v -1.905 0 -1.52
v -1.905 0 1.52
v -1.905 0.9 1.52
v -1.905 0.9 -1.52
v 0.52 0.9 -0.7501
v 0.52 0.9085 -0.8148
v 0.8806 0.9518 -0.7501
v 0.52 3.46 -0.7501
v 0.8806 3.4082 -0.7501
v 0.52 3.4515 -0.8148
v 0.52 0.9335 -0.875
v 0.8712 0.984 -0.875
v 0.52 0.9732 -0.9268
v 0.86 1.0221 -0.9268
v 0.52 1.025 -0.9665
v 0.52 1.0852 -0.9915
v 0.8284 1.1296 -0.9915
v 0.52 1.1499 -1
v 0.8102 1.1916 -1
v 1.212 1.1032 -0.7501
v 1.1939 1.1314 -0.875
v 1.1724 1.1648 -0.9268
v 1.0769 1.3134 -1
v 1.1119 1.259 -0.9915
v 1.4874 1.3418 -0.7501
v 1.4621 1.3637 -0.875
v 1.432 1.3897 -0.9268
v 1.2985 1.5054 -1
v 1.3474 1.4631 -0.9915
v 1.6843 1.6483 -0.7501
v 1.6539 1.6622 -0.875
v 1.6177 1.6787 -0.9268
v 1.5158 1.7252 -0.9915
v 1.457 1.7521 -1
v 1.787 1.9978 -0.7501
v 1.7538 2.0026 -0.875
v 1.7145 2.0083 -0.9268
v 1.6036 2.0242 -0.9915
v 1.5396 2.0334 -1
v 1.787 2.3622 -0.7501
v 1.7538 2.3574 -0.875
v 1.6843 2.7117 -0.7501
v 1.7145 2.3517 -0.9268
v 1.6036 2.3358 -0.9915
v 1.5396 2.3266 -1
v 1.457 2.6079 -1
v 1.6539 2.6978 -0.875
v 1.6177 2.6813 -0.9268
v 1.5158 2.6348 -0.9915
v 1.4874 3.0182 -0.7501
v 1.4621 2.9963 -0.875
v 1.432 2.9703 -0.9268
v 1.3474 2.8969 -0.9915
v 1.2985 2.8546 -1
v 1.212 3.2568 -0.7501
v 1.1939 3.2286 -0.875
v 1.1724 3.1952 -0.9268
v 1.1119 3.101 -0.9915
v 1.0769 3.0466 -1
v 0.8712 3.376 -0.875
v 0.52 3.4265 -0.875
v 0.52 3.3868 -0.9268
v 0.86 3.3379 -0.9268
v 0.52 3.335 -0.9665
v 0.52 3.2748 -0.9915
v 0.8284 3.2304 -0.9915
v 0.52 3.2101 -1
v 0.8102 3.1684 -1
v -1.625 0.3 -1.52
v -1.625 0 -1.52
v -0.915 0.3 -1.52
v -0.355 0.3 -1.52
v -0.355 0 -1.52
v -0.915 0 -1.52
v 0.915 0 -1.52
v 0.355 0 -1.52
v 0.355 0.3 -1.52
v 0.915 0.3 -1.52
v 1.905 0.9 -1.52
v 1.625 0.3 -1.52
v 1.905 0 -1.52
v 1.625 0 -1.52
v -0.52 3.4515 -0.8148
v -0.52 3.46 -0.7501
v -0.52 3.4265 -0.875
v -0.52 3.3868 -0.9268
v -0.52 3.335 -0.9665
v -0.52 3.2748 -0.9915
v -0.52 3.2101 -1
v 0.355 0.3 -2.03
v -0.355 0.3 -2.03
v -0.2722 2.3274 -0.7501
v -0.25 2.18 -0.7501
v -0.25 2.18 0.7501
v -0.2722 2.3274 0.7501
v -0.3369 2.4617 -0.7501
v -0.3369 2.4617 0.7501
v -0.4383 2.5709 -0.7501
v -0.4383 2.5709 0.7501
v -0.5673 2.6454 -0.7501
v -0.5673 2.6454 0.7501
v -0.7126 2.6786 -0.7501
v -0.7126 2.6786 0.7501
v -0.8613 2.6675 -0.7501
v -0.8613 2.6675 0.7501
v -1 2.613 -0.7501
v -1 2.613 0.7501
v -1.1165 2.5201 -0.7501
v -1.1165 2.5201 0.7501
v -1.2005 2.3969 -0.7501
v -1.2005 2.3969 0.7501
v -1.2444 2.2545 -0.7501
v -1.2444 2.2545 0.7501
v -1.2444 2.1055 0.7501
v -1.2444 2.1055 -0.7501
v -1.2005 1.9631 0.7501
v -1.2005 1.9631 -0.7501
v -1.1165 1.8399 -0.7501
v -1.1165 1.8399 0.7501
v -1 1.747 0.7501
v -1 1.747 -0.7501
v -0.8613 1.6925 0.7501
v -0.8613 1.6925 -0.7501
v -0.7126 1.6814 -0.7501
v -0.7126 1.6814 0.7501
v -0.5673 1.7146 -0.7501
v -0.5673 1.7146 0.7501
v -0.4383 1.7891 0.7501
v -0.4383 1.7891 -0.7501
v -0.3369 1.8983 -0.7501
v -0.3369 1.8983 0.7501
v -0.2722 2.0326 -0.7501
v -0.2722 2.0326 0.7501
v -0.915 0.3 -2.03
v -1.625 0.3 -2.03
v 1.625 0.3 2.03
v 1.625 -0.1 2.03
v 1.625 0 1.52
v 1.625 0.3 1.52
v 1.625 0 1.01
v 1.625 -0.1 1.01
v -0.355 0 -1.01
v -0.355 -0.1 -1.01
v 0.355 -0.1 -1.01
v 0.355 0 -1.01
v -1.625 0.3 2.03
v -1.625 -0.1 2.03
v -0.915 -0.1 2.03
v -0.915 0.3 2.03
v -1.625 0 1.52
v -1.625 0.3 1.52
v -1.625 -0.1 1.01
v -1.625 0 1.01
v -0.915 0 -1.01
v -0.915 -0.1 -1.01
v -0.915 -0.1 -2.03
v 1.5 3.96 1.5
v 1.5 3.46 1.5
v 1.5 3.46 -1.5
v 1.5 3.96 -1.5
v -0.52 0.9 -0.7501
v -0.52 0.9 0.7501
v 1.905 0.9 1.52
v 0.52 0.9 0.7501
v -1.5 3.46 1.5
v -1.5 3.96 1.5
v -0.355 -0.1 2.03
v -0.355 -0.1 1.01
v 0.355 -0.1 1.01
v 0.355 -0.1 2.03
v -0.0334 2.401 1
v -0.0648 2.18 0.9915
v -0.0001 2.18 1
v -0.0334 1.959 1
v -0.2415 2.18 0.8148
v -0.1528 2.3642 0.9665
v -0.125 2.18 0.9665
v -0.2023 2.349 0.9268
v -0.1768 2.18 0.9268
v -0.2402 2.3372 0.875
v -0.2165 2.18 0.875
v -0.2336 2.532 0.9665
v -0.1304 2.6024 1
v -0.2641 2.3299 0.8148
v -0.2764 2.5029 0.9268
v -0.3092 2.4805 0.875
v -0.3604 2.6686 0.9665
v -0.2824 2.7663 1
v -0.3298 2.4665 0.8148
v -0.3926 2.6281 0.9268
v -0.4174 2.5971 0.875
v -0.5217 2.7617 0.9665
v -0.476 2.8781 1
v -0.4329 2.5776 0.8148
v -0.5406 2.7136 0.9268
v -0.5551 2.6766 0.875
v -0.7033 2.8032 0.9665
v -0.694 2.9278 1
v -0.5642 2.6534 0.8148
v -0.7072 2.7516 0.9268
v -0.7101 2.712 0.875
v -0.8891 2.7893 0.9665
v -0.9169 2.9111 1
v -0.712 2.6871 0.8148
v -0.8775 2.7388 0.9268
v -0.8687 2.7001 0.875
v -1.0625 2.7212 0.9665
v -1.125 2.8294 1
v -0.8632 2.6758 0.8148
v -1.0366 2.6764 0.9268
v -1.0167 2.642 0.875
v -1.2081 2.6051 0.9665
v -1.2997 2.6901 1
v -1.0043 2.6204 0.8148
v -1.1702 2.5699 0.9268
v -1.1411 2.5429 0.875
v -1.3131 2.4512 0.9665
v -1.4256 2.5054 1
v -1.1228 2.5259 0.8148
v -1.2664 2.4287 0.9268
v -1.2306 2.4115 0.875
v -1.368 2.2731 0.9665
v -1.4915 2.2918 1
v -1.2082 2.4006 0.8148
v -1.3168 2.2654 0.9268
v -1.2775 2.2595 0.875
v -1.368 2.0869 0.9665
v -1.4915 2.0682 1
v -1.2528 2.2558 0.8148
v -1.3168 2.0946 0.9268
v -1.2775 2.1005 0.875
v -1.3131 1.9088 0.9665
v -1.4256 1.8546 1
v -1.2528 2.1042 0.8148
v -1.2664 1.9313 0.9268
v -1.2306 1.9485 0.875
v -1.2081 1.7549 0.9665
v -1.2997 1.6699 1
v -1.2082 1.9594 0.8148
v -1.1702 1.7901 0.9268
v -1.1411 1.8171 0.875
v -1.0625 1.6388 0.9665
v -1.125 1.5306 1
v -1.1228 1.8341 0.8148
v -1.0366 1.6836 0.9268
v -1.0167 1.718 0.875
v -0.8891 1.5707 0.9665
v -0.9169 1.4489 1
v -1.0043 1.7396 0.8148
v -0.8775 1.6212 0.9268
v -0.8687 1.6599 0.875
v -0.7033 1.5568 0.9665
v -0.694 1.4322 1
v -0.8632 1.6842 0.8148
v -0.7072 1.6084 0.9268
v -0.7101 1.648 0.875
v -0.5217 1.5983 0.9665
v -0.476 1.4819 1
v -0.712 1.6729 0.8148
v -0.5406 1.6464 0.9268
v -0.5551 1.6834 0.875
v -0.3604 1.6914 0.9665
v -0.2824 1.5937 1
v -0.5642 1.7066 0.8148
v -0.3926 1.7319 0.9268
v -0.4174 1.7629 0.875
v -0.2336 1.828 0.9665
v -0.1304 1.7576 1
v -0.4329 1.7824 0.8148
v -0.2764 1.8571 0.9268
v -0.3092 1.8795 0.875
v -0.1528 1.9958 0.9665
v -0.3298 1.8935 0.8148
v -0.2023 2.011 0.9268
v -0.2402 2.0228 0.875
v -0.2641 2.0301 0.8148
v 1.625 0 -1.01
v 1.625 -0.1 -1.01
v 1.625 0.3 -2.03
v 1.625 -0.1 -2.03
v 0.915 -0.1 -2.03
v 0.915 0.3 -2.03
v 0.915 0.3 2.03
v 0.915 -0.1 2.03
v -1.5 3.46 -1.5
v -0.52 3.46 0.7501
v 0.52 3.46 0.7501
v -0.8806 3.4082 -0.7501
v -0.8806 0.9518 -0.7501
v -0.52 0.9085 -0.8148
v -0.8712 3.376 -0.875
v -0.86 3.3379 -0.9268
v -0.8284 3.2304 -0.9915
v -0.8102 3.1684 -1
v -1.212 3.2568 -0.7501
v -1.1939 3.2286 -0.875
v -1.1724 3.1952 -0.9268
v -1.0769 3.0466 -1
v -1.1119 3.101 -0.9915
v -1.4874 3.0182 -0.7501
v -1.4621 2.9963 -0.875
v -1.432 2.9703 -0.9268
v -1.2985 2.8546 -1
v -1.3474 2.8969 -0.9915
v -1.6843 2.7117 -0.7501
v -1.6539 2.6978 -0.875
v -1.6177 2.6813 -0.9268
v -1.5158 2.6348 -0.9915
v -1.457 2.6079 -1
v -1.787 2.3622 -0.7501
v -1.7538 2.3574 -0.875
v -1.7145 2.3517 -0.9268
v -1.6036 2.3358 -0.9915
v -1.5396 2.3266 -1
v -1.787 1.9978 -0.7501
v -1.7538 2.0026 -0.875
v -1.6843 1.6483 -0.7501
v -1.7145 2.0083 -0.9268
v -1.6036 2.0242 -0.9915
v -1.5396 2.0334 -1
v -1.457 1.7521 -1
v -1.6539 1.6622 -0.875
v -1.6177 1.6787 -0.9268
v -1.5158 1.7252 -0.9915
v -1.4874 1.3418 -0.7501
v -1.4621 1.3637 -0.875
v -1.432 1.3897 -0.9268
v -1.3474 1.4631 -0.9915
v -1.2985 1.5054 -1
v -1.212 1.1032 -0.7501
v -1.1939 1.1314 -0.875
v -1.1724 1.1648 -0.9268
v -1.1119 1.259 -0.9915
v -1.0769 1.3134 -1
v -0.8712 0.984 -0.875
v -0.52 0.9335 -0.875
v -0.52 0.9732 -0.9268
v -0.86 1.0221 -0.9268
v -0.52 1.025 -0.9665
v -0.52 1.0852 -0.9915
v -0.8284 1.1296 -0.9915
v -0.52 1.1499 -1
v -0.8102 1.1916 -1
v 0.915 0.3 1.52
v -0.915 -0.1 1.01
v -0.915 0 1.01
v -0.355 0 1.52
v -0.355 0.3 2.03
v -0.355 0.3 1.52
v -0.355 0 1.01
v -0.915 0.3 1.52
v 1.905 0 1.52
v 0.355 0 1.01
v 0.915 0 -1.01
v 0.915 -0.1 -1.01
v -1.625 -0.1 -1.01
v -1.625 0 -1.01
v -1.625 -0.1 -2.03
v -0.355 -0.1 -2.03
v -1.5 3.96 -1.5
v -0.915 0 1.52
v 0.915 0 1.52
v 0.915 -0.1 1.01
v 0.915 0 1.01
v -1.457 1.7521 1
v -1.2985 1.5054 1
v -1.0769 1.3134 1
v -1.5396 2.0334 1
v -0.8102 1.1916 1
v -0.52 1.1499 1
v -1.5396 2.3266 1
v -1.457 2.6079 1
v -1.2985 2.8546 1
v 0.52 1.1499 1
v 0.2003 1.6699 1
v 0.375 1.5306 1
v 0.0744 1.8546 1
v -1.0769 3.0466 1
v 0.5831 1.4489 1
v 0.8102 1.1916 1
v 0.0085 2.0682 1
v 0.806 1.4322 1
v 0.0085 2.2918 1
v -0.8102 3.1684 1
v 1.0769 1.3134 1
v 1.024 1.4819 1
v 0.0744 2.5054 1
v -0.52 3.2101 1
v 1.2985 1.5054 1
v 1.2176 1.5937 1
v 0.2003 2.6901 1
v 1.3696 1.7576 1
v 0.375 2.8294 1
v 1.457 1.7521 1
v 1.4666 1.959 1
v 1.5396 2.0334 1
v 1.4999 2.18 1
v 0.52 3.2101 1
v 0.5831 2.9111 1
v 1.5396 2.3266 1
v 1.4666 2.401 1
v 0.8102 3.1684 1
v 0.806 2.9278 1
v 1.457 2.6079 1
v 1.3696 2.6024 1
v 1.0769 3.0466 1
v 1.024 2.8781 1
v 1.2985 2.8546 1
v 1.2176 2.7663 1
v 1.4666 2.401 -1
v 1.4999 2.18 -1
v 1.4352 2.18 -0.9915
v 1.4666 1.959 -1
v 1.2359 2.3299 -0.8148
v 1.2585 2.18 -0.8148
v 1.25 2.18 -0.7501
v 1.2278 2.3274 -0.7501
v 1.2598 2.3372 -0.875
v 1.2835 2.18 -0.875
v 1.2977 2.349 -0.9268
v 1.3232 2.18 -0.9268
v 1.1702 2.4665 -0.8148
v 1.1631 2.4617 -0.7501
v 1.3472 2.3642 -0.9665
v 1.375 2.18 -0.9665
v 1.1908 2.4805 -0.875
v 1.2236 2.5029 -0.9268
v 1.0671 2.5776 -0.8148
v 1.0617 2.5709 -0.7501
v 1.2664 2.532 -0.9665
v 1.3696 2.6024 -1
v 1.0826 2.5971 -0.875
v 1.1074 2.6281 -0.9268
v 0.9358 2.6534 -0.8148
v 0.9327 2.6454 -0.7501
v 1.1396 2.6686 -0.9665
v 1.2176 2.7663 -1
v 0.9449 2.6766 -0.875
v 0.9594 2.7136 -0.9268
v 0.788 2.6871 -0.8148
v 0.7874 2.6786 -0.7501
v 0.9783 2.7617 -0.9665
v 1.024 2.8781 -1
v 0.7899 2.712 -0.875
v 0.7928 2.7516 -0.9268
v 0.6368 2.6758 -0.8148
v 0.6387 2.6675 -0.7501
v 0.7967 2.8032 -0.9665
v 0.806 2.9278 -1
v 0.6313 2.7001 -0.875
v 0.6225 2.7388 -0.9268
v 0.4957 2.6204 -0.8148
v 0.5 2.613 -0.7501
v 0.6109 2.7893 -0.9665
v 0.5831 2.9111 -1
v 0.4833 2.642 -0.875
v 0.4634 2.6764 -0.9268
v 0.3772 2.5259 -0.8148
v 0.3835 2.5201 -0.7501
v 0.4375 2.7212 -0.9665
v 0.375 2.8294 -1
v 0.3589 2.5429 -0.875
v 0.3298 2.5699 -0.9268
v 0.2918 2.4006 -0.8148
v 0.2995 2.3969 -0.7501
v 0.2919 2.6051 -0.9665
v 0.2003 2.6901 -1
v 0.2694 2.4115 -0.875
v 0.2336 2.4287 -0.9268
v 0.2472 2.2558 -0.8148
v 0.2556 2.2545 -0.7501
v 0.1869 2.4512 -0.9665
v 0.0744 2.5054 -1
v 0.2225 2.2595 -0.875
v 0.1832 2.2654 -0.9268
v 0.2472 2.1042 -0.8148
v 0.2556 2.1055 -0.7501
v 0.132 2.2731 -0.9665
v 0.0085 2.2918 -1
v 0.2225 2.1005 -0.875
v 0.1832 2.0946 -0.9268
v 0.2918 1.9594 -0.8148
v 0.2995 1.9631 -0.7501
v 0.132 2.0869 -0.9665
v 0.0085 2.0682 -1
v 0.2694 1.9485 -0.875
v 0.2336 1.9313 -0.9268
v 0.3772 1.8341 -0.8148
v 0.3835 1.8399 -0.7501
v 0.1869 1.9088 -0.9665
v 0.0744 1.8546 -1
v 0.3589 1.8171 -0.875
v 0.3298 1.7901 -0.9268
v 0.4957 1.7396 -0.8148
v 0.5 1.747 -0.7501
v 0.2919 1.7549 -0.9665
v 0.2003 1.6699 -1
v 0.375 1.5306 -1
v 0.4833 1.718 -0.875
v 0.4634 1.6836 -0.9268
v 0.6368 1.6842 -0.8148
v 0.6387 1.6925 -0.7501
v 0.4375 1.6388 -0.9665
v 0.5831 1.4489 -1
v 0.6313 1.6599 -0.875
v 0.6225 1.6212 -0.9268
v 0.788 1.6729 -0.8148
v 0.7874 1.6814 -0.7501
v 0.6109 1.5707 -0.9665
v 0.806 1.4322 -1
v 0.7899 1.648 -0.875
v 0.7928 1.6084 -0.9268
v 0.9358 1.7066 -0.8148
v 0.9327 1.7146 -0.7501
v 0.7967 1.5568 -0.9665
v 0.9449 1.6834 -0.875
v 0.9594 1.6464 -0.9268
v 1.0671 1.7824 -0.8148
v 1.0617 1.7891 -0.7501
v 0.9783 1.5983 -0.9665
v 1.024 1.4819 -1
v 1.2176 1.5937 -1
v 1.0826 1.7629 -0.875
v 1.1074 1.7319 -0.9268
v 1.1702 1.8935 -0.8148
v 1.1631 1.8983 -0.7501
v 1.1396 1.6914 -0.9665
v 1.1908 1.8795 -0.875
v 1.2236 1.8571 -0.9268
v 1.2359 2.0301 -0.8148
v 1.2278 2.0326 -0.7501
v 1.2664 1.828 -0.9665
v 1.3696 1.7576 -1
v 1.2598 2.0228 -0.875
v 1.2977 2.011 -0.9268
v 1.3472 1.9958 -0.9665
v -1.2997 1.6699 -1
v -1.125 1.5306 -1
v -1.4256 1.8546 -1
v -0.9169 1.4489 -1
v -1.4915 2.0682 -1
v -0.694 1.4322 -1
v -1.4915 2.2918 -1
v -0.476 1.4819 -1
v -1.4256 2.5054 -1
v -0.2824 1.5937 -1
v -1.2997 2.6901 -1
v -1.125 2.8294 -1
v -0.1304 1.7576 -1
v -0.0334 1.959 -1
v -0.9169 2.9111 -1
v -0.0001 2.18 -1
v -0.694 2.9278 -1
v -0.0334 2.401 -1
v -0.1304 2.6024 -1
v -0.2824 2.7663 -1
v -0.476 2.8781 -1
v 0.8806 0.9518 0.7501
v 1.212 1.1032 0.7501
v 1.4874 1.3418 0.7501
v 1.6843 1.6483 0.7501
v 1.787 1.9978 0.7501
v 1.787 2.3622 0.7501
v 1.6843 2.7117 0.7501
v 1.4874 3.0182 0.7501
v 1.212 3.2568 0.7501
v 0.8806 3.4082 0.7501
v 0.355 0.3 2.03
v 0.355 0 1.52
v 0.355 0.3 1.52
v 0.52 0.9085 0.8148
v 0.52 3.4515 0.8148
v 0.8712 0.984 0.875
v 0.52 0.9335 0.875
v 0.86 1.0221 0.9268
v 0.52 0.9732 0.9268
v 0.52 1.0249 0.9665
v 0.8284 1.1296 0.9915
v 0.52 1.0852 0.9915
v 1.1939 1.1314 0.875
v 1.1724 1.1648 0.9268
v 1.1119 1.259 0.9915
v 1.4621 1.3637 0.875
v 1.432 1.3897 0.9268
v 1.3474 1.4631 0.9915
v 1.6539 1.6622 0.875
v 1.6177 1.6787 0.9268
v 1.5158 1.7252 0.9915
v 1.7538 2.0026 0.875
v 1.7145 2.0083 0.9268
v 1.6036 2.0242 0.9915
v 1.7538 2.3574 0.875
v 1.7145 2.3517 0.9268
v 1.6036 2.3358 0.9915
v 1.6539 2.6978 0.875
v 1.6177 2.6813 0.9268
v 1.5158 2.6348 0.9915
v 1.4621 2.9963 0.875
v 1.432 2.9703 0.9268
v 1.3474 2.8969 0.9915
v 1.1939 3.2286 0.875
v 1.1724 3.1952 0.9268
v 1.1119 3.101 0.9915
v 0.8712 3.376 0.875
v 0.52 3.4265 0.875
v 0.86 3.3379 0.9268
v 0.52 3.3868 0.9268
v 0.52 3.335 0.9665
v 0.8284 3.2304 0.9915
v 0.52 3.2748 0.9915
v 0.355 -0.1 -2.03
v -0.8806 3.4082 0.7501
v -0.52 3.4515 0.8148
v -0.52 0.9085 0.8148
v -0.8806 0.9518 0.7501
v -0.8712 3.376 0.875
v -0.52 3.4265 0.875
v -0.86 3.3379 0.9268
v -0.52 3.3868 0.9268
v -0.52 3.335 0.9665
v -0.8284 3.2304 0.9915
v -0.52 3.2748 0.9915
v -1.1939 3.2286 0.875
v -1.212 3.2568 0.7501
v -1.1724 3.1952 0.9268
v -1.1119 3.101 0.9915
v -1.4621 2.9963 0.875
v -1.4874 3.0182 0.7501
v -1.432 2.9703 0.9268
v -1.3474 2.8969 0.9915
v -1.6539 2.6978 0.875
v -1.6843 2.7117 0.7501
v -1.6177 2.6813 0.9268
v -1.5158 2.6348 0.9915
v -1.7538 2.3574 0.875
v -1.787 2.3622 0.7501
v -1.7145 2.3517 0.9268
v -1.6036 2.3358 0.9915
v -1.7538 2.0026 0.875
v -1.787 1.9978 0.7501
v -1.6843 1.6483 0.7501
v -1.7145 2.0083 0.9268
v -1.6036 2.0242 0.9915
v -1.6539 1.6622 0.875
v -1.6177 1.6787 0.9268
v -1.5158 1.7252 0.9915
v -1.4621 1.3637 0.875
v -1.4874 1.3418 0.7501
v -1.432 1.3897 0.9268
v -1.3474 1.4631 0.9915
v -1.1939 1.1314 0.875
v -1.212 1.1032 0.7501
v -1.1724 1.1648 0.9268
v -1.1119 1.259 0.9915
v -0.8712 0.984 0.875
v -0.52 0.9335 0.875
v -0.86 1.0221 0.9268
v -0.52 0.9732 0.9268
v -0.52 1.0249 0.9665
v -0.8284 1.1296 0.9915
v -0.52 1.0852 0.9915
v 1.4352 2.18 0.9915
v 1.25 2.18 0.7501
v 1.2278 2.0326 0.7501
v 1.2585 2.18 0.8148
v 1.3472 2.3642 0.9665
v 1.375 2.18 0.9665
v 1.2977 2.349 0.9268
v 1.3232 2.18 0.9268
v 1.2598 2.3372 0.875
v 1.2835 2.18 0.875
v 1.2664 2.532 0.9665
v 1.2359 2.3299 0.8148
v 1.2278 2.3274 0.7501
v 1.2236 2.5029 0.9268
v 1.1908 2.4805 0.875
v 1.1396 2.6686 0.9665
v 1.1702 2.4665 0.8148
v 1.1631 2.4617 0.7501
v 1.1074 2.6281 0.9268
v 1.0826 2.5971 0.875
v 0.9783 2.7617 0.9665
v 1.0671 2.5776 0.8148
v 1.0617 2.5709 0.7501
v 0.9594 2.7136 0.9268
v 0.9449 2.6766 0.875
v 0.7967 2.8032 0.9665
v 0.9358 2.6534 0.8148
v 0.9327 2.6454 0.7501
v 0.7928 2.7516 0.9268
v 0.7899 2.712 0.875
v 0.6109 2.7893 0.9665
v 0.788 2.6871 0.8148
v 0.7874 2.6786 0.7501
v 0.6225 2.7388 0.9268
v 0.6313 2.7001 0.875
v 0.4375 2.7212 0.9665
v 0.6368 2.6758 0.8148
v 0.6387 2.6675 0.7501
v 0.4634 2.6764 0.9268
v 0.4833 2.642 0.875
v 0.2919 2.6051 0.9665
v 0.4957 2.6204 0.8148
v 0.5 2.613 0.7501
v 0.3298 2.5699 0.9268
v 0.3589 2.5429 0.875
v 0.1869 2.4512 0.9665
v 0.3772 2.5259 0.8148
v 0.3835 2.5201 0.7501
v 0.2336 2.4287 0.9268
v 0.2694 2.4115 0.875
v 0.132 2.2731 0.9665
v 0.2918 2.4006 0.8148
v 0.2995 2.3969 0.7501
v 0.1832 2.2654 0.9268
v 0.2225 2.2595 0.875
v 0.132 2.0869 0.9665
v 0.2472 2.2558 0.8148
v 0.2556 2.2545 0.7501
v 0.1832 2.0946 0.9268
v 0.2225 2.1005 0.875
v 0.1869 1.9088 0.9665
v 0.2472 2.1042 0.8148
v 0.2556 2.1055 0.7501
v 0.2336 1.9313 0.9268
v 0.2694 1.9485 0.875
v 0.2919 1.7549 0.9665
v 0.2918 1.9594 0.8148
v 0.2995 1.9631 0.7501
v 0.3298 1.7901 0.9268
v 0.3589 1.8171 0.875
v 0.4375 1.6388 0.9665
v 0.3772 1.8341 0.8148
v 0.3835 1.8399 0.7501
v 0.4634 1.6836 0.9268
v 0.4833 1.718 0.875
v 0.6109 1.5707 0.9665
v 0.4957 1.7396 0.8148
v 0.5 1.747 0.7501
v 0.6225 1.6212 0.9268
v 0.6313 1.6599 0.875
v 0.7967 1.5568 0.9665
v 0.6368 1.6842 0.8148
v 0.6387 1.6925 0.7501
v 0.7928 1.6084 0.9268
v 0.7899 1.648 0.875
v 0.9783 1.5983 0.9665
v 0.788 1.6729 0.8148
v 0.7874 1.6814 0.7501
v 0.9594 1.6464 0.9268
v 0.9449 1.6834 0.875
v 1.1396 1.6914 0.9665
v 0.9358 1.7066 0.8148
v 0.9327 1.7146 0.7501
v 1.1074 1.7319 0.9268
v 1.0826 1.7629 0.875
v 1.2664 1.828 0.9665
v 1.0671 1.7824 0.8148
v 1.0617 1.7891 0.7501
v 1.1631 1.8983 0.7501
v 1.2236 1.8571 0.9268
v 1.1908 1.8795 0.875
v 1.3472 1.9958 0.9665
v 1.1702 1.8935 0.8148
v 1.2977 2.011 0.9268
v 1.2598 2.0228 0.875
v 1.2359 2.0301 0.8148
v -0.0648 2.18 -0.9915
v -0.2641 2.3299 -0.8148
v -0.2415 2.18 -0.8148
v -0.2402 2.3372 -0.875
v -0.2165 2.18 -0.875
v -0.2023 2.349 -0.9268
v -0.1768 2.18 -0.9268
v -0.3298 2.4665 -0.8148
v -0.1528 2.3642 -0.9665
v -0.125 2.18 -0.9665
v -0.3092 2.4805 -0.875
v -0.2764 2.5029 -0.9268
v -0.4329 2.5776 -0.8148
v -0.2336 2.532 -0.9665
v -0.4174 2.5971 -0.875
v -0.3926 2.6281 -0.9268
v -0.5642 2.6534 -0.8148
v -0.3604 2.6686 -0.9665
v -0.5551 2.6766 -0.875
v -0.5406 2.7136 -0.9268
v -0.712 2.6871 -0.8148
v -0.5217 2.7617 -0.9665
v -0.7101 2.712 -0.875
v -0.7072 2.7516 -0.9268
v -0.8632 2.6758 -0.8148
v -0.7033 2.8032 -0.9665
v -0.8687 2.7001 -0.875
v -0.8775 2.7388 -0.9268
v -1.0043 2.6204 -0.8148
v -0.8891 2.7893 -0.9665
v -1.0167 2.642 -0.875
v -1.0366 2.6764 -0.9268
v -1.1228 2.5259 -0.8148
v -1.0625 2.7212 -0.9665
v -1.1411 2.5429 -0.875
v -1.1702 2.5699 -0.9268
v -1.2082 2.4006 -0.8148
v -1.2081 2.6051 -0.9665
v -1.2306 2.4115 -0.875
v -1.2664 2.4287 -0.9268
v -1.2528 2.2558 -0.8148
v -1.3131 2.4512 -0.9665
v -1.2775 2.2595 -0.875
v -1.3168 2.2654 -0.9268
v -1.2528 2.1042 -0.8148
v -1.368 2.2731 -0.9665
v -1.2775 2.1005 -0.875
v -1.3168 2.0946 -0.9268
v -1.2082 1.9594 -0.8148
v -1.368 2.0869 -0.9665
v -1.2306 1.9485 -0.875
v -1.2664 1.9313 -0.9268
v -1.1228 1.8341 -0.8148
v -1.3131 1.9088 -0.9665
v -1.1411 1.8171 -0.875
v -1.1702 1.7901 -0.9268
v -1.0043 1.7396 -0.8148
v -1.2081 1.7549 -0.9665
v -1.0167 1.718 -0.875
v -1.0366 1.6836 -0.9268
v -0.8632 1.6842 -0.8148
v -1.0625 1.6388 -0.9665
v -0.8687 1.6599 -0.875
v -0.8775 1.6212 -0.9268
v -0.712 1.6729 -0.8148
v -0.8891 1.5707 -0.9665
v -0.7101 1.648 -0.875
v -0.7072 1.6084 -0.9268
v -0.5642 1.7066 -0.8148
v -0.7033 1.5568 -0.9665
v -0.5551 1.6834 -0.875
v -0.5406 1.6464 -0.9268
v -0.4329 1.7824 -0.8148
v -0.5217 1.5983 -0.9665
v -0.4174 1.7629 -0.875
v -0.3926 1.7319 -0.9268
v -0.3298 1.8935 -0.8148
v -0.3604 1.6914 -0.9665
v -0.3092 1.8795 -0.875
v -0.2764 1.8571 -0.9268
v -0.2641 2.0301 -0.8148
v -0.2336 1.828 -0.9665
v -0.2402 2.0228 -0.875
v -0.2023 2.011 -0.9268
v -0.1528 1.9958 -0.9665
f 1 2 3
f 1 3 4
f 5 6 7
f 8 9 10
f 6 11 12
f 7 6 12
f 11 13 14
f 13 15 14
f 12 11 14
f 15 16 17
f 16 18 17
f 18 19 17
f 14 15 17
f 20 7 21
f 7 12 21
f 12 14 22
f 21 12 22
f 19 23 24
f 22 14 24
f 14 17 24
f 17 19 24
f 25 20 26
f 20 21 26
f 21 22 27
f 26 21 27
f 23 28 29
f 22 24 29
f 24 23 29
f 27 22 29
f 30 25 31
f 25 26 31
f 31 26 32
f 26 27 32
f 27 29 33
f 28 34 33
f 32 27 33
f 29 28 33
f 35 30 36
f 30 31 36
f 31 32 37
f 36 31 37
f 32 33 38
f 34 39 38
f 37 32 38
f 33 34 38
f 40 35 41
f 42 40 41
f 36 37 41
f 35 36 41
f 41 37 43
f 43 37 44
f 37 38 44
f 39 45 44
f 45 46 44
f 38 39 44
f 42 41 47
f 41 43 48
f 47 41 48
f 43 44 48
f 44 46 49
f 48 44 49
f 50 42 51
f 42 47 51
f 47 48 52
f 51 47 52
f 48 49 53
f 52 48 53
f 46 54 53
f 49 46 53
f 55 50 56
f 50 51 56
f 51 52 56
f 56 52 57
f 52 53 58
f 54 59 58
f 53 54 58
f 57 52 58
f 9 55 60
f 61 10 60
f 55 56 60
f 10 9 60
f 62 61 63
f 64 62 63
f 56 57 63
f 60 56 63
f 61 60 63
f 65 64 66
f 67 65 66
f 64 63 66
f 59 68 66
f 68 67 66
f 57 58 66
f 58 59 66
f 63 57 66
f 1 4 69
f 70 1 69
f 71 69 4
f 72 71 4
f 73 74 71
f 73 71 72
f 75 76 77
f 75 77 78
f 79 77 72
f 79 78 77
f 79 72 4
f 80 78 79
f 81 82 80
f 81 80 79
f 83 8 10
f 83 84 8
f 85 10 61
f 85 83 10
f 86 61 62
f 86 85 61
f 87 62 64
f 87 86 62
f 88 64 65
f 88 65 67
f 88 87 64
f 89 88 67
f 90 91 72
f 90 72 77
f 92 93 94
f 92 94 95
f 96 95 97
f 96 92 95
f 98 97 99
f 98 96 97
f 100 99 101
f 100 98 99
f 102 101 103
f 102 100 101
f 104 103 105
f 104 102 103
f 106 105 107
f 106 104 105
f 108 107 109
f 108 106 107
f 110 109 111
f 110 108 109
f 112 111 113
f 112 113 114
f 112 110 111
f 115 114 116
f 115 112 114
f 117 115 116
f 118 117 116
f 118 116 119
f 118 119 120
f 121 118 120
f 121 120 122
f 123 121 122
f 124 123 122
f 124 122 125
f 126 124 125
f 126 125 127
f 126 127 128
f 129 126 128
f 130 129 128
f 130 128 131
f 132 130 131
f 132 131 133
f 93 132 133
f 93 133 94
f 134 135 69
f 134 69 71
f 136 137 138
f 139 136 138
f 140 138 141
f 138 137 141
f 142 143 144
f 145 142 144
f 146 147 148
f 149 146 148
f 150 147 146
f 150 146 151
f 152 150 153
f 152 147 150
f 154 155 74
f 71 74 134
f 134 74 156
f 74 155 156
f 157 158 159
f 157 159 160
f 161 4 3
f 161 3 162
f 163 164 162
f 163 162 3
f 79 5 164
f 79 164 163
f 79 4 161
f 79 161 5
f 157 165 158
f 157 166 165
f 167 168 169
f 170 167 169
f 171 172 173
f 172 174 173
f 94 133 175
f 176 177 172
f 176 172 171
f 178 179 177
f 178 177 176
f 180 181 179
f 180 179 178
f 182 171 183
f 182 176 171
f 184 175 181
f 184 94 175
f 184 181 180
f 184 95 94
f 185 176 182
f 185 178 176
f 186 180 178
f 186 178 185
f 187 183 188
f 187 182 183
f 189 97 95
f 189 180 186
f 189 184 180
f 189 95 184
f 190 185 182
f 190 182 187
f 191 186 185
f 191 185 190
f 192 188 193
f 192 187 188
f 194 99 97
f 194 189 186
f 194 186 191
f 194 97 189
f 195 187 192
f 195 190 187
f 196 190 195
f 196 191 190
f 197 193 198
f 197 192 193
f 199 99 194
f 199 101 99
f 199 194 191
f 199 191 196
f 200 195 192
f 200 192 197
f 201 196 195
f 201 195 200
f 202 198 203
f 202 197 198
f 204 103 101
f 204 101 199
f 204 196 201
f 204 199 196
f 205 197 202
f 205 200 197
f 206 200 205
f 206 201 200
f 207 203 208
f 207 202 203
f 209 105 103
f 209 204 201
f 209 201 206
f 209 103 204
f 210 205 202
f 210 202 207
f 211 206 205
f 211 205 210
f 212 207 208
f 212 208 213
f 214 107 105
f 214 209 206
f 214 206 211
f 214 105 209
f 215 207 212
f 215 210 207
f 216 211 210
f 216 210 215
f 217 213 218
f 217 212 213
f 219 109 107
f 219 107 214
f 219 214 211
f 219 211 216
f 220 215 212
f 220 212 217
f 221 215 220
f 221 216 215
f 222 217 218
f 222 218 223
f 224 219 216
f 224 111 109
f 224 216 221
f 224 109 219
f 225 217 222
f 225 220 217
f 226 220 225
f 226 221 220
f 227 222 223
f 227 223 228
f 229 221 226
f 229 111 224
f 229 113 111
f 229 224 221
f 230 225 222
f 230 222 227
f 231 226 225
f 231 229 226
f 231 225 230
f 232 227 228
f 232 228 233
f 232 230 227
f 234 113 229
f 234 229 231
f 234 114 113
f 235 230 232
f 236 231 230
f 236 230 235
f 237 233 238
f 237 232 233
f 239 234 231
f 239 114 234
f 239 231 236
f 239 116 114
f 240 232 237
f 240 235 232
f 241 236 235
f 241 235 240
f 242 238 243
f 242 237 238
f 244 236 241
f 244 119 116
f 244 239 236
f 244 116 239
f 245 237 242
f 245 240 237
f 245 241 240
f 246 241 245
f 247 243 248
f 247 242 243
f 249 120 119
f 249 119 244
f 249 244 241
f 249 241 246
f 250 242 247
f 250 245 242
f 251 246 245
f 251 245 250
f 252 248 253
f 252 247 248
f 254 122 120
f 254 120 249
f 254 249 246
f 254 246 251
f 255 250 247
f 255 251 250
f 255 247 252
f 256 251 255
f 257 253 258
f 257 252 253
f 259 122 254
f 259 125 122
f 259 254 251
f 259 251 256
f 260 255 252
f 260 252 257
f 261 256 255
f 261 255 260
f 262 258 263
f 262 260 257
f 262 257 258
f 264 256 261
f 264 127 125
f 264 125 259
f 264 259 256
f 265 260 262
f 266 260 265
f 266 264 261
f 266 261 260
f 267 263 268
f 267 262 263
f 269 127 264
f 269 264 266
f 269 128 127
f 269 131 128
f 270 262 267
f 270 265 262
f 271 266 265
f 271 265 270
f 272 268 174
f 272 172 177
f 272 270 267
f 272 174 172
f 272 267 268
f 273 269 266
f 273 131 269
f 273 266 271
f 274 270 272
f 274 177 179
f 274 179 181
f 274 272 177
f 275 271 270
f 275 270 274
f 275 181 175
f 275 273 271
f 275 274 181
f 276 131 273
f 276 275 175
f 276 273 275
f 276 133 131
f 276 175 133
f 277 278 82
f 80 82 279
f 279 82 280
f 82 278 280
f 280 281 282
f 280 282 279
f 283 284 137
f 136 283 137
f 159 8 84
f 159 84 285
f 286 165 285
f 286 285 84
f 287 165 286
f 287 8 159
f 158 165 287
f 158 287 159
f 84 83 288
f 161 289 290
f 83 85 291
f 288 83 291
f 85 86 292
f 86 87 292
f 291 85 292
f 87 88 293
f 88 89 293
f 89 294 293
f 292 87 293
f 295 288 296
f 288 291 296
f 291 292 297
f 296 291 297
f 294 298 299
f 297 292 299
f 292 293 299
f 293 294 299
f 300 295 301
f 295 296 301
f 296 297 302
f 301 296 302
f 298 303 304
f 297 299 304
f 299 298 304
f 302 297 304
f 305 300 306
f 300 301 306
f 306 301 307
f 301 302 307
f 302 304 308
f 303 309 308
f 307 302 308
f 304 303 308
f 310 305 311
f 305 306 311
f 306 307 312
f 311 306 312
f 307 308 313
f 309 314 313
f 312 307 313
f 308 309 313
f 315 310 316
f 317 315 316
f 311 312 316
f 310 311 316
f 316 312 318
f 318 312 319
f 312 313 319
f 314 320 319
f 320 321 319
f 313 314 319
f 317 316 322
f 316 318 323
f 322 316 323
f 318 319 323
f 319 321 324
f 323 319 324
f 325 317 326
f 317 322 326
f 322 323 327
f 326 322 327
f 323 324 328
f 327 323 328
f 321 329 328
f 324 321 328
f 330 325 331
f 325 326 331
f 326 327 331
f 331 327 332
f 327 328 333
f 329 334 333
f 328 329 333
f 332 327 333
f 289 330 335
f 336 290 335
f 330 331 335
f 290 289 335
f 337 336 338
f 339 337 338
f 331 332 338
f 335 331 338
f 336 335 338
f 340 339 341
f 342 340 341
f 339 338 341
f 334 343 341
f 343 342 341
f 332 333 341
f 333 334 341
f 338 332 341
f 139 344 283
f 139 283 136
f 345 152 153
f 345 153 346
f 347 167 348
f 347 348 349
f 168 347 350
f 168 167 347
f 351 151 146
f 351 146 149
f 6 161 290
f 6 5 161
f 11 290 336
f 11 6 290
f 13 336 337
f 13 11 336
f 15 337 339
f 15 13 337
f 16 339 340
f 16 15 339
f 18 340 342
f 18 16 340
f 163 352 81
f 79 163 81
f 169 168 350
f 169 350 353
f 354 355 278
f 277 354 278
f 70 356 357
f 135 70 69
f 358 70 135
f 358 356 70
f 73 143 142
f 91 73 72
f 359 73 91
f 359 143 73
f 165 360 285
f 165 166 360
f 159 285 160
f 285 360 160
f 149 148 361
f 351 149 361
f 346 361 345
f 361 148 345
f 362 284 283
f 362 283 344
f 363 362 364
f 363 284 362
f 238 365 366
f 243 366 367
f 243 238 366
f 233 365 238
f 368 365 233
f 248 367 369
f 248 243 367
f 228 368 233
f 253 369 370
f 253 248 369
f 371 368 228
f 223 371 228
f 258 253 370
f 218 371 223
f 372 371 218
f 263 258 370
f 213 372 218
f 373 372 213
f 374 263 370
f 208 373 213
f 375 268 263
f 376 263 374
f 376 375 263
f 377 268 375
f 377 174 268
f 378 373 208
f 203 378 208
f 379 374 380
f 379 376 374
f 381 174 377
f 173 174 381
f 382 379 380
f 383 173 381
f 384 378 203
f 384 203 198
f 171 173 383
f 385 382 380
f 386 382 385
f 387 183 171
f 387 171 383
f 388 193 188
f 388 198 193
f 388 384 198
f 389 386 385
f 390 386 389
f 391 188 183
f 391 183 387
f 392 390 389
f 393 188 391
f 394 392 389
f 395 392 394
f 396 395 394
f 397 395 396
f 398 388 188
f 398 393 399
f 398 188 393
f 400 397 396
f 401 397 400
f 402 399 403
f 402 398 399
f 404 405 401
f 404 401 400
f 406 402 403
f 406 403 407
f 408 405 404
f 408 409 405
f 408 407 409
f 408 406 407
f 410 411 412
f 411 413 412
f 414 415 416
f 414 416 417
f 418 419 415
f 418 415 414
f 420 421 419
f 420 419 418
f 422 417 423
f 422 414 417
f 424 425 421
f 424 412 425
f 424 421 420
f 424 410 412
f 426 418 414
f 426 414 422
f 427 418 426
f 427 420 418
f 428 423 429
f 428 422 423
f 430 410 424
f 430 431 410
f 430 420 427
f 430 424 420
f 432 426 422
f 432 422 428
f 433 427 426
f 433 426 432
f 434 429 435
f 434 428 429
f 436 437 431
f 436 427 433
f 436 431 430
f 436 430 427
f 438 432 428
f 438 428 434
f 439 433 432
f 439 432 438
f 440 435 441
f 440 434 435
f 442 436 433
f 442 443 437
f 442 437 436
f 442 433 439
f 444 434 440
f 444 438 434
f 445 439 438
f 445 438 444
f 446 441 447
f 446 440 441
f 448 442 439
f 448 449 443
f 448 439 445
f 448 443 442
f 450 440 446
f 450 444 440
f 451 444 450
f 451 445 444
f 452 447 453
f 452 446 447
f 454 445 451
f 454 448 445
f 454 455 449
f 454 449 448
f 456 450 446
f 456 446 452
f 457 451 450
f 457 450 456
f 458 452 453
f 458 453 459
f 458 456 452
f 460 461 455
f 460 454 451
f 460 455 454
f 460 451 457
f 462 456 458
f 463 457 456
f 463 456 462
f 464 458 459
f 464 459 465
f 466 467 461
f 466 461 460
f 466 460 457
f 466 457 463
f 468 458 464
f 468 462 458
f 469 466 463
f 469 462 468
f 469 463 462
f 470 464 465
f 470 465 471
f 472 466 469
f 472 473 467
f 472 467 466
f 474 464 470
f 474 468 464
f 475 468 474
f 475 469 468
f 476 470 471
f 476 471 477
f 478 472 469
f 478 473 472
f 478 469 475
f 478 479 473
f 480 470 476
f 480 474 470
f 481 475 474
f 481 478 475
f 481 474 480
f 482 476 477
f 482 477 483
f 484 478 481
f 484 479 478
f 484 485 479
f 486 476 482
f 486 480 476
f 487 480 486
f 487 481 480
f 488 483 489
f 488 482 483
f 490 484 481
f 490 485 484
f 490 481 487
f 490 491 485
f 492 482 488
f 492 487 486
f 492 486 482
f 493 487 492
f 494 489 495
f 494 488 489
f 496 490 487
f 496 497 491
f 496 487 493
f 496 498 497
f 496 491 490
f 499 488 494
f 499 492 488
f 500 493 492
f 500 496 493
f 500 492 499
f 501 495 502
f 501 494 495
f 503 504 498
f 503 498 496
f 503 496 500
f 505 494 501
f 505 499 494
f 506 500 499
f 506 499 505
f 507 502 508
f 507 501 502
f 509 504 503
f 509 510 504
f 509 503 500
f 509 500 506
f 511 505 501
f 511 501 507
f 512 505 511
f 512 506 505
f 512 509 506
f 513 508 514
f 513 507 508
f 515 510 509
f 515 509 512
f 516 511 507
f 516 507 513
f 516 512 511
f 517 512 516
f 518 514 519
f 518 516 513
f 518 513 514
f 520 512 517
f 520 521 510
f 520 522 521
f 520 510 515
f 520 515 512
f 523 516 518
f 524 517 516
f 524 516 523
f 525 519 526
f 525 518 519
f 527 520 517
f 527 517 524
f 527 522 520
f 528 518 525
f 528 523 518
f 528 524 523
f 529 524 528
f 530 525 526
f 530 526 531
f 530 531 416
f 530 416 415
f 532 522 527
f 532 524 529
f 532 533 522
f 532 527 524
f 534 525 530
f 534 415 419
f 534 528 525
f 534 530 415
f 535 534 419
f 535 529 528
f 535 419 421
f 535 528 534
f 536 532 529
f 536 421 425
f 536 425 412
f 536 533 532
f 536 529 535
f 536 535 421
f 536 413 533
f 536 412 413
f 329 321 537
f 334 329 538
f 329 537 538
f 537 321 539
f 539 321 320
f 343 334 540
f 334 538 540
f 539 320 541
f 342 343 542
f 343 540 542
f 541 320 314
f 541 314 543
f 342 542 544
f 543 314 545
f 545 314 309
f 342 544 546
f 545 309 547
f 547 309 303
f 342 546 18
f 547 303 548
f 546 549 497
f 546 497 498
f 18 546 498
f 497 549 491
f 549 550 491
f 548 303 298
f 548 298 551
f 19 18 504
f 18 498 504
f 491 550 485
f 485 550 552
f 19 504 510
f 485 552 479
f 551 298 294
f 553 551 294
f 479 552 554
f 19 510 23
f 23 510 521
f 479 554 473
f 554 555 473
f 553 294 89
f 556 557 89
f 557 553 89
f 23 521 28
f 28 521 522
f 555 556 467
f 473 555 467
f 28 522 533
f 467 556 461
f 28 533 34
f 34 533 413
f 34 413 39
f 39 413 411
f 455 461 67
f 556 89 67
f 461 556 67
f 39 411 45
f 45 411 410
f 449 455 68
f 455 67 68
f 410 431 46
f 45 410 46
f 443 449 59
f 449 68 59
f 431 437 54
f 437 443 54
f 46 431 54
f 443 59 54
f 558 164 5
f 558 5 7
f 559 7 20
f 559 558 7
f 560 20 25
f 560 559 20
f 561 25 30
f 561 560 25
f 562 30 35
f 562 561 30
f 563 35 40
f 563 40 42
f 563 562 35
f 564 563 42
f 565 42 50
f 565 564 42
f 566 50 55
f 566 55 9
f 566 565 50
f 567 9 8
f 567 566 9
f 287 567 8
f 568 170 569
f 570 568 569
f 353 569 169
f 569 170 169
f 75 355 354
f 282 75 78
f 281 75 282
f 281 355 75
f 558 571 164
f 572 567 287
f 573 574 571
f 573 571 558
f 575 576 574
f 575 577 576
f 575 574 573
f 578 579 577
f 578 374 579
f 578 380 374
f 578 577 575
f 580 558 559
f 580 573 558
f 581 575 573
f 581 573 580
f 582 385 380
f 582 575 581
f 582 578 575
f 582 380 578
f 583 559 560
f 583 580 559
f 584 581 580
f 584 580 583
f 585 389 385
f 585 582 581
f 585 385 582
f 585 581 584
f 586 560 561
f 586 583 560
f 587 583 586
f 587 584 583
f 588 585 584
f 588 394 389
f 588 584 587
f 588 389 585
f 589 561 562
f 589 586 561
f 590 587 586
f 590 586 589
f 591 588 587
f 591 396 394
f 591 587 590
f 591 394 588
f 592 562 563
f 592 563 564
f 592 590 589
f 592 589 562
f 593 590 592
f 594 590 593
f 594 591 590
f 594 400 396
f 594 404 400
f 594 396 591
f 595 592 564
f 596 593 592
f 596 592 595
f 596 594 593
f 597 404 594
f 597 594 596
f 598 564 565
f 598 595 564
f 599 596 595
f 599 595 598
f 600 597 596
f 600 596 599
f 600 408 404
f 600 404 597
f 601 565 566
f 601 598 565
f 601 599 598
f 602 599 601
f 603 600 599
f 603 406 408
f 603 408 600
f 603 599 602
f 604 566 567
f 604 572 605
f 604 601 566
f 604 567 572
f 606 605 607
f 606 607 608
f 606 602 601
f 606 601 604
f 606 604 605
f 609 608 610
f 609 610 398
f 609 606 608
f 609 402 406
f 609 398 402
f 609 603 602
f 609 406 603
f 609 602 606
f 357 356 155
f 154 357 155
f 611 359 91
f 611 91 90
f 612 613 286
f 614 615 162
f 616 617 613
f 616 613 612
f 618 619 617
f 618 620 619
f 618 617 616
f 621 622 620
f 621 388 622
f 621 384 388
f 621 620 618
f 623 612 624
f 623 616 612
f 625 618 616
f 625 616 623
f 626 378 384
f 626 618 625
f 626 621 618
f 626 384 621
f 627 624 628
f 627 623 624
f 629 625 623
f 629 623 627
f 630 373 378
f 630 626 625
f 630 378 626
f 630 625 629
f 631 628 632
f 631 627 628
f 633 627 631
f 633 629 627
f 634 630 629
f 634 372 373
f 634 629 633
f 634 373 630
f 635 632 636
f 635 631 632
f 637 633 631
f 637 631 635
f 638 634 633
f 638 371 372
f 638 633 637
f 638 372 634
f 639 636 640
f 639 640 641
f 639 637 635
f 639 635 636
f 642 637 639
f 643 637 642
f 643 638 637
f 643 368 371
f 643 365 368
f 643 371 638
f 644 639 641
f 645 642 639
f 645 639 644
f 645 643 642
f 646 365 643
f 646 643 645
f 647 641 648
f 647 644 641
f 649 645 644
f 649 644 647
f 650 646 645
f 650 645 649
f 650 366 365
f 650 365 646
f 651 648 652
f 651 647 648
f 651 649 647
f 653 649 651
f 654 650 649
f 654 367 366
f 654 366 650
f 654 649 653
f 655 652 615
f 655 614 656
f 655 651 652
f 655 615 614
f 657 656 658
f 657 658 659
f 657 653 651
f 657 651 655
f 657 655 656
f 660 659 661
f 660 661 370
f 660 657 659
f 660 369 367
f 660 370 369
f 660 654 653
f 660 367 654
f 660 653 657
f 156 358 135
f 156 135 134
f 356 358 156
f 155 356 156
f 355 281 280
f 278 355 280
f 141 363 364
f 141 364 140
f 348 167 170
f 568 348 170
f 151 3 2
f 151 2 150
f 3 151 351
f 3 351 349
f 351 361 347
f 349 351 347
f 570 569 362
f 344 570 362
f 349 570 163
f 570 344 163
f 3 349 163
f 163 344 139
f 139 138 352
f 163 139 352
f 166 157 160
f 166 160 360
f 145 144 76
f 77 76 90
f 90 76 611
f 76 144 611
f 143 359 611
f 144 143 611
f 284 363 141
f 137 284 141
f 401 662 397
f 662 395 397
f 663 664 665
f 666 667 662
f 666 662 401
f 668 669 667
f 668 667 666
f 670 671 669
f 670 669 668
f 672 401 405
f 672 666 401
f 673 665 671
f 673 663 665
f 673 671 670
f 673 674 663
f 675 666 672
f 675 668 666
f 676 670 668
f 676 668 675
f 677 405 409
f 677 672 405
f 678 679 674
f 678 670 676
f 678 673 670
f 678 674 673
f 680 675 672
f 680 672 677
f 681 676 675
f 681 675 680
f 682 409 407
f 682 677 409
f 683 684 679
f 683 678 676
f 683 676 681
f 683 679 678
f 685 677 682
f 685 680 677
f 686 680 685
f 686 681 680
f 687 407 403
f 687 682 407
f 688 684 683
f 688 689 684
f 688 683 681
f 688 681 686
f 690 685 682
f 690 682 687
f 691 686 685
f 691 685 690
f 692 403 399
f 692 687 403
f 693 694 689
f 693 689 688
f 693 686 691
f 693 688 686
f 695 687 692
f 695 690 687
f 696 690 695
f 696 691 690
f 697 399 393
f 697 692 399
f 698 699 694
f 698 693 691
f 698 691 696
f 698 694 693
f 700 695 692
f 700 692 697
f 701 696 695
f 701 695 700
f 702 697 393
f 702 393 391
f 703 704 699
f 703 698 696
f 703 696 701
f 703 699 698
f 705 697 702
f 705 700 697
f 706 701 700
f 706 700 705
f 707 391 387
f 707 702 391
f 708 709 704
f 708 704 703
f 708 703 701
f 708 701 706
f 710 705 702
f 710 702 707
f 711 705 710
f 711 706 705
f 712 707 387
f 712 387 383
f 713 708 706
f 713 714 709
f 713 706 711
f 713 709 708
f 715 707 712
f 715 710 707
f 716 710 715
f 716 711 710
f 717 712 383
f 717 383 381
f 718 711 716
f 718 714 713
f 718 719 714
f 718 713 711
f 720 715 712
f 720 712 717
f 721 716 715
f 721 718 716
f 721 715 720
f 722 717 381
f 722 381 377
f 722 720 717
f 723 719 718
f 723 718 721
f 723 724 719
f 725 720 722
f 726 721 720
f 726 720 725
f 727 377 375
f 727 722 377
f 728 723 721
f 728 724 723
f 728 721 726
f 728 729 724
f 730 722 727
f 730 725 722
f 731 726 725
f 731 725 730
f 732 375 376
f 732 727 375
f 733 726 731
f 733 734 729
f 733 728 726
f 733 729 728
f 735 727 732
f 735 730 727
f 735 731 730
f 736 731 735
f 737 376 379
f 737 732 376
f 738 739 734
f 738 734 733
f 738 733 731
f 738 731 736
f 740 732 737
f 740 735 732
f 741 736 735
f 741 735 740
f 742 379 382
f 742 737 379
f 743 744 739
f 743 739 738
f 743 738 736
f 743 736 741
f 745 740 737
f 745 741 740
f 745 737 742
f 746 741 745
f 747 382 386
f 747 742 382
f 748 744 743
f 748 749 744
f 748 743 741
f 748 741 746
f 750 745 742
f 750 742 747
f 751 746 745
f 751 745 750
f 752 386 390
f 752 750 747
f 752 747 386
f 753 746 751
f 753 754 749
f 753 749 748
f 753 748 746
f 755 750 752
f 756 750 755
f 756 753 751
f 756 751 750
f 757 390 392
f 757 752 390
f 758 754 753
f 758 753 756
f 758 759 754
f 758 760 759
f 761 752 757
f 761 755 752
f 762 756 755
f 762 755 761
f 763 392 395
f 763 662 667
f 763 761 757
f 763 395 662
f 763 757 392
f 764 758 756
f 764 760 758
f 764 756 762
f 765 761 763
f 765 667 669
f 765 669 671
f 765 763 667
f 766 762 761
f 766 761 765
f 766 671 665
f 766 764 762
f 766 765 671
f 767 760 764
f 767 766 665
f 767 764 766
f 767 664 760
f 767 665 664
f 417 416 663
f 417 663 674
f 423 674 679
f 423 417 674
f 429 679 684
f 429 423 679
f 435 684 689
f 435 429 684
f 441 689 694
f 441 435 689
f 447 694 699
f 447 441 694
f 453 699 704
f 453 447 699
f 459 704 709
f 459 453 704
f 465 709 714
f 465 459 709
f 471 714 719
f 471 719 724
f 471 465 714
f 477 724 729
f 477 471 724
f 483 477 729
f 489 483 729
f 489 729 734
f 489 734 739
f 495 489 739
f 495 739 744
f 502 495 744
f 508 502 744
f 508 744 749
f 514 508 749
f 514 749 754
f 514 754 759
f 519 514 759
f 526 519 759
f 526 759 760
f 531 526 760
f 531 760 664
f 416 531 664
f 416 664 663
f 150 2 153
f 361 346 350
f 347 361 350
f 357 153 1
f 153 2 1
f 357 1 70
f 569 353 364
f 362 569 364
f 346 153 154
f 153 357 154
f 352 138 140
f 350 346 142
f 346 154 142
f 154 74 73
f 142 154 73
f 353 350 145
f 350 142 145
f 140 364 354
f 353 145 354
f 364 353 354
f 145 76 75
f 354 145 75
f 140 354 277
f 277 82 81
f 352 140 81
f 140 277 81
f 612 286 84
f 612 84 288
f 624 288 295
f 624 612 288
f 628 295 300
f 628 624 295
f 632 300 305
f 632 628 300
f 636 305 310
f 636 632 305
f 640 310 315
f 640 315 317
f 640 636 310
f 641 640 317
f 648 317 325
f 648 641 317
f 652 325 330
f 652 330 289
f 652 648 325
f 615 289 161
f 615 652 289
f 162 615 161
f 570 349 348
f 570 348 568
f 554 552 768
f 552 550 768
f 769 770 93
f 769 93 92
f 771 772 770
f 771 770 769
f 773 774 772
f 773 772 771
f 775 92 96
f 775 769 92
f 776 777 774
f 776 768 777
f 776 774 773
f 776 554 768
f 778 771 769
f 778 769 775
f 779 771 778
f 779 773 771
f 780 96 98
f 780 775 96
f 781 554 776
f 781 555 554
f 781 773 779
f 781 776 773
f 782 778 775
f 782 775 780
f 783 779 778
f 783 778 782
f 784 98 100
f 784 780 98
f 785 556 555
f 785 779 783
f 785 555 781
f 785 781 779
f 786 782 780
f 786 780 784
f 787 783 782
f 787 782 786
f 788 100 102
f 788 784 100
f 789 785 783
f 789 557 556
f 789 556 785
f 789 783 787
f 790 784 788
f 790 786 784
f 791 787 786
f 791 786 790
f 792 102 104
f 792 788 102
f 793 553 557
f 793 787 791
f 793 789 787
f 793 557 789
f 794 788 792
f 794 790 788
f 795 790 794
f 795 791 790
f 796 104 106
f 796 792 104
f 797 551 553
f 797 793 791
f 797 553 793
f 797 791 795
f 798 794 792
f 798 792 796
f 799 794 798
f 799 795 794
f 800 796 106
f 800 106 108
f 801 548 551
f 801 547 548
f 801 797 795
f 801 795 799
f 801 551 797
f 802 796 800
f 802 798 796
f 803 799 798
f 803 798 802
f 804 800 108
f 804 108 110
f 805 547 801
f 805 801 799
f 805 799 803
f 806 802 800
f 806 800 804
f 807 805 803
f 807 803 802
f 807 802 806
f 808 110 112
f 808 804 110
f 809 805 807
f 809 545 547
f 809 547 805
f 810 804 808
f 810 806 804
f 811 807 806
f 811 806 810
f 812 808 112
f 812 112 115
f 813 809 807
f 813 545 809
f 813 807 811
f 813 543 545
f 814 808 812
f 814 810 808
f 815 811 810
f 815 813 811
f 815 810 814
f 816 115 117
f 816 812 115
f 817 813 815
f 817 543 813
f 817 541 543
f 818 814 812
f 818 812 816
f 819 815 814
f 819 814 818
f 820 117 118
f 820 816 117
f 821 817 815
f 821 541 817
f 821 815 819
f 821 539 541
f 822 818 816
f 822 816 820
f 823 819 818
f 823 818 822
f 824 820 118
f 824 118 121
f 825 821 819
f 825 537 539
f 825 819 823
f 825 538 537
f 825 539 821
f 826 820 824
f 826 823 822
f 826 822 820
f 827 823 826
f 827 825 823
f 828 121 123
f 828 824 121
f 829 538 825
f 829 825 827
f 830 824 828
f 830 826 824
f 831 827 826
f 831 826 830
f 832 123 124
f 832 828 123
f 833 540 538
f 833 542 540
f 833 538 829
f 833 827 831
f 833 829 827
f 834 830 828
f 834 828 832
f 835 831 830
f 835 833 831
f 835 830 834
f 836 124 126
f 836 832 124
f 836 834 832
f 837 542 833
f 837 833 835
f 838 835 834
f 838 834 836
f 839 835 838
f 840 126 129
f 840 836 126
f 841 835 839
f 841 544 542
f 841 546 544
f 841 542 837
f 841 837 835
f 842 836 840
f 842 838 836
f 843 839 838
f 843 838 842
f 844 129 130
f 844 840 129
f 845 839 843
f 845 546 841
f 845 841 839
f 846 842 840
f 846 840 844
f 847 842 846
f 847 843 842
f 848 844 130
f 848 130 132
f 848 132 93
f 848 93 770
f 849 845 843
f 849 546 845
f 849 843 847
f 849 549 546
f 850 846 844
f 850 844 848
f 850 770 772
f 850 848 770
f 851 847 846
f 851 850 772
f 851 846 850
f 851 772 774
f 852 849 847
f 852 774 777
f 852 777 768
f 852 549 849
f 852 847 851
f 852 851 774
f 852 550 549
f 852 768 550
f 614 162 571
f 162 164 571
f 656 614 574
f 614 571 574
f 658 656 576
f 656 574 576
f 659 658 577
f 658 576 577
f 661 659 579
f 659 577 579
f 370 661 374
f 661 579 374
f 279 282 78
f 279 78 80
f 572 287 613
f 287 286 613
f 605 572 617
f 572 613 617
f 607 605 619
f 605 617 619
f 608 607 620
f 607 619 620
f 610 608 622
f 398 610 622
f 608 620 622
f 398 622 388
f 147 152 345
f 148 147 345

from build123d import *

# Parameters (mm, degrees)
SKETCH_1_W           = 3.81
SKETCH_1_H           = 3.04
EXTRUDE_1_DEPTH      = 0.9
EXTRUDE_2_DEPTH      = 0.3
EXTRUDE_2_DEPTH_BACK = 0.1
SKETCH_2_W           = 0.71
SKETCH_2_H           = 1.02
SKETCH_3_R           = 0.5
EXTRUDE_3_DEPTH      = 1
EXTRUDE_4_DEPTH      = 1.5
FILLET_2_R           = 0.25


with BuildPart() as part:
    # Эскиз1 → Бобышка-Вытянуть1 (new body)
    with BuildSketch(Plane(origin=(0, 0, 0), x_dir=(1, 0, 0), z_dir=(0, 1, 0))):
        Rectangle(SKETCH_1_W, SKETCH_1_H)
    extrude(amount=EXTRUDE_1_DEPTH)

    # Эскиз2 → Бобышка-Вытянуть2 (add, two sides: drawn at the far end of the back side and taken through both)
    with BuildSketch(Plane(origin=(0, 0, 0), x_dir=(1, 0, 0), z_dir=(0, 1, 0)).offset(-EXTRUDE_2_DEPTH_BACK)):
        with Locations((1.27, -1.52)):
            Rectangle(SKETCH_2_W, SKETCH_2_H)
        with Locations((0, -1.52)):
            Rectangle(SKETCH_2_W, SKETCH_2_H)
        with Locations((-1.27, -1.52)):
            Rectangle(SKETCH_2_W, SKETCH_2_H)
        with Locations((-1.27, 1.52)):
            Rectangle(SKETCH_2_W, SKETCH_2_H)
        with Locations((0, 1.52)):
            Rectangle(SKETCH_2_W, SKETCH_2_H)
        with Locations((1.27, 1.52)):
            Rectangle(SKETCH_2_W, SKETCH_2_H)
    extrude(amount=EXTRUDE_2_DEPTH + EXTRUDE_2_DEPTH_BACK)


with BuildPart() as body_2:
    # Эскиз3 → Бобышка-Вытянуть3 (new, symmetric)
    with BuildSketch(Plane.XY):
        with BuildLine():
            Line((0.52, 3.46), (-0.52, 3.46))
            ThreePointArc((-0.52, 3.46), (-1.8, 2.18), (-0.52, 0.9))
            Line((-0.52, 0.9), (0.52, 0.9))
            ThreePointArc((0.52, 0.9), (1.8, 2.18), (0.52, 3.46))
        make_face()
        with Locations((-0.75, 2.18)):
            Circle(SKETCH_3_R, mode=Mode.SUBTRACT)
        with Locations((0.75, 2.18)):
            Circle(SKETCH_3_R, mode=Mode.SUBTRACT)
    extrude(amount=EXTRUDE_3_DEPTH, both=True)

    # Скругление2
    fillet_2_edges = [body_2.edges().sort_by_distance(p)[0] for p in [
        (0, 0.9, 1),
        (1.8, 2.18, -1),
        (0, 3.46, -1),
        (-1.8, 2.18, -1),
        (0.25, 2.18, -1),
        (-1.25, 2.18, -1),
        (0, 0.9, -1),
        (-1.25, 2.18, 1),
        (0.25, 2.18, 1),
        (-1.8, 2.18, 1),
        (0, 3.46, 1),
        (1.8, 2.18, 1),
    ]]
    fillet(fillet_2_edges, radius=FILLET_2_R - 0.0001)  # a hair under: the kernel refuses the full size


with BuildPart() as body_3:
    # Эскиз3<3> → Бобышка-Вытянуть4 (new, symmetric)
    with BuildSketch(Plane.XY):
        Polygon((-1.5, 3.46), (-0.52, 3.46), (0.52, 3.46), (1.5, 3.46), (1.5, 3.96), (-1.5, 3.96), align=None)
    extrude(amount=EXTRUDE_4_DEPTH, both=True)


with BuildPart() as part_1:
    add(part.part)

    # Combine 1: union body 2, body 3
    add(body_2.part)
    add(body_3.part)


solid = part_1.part
